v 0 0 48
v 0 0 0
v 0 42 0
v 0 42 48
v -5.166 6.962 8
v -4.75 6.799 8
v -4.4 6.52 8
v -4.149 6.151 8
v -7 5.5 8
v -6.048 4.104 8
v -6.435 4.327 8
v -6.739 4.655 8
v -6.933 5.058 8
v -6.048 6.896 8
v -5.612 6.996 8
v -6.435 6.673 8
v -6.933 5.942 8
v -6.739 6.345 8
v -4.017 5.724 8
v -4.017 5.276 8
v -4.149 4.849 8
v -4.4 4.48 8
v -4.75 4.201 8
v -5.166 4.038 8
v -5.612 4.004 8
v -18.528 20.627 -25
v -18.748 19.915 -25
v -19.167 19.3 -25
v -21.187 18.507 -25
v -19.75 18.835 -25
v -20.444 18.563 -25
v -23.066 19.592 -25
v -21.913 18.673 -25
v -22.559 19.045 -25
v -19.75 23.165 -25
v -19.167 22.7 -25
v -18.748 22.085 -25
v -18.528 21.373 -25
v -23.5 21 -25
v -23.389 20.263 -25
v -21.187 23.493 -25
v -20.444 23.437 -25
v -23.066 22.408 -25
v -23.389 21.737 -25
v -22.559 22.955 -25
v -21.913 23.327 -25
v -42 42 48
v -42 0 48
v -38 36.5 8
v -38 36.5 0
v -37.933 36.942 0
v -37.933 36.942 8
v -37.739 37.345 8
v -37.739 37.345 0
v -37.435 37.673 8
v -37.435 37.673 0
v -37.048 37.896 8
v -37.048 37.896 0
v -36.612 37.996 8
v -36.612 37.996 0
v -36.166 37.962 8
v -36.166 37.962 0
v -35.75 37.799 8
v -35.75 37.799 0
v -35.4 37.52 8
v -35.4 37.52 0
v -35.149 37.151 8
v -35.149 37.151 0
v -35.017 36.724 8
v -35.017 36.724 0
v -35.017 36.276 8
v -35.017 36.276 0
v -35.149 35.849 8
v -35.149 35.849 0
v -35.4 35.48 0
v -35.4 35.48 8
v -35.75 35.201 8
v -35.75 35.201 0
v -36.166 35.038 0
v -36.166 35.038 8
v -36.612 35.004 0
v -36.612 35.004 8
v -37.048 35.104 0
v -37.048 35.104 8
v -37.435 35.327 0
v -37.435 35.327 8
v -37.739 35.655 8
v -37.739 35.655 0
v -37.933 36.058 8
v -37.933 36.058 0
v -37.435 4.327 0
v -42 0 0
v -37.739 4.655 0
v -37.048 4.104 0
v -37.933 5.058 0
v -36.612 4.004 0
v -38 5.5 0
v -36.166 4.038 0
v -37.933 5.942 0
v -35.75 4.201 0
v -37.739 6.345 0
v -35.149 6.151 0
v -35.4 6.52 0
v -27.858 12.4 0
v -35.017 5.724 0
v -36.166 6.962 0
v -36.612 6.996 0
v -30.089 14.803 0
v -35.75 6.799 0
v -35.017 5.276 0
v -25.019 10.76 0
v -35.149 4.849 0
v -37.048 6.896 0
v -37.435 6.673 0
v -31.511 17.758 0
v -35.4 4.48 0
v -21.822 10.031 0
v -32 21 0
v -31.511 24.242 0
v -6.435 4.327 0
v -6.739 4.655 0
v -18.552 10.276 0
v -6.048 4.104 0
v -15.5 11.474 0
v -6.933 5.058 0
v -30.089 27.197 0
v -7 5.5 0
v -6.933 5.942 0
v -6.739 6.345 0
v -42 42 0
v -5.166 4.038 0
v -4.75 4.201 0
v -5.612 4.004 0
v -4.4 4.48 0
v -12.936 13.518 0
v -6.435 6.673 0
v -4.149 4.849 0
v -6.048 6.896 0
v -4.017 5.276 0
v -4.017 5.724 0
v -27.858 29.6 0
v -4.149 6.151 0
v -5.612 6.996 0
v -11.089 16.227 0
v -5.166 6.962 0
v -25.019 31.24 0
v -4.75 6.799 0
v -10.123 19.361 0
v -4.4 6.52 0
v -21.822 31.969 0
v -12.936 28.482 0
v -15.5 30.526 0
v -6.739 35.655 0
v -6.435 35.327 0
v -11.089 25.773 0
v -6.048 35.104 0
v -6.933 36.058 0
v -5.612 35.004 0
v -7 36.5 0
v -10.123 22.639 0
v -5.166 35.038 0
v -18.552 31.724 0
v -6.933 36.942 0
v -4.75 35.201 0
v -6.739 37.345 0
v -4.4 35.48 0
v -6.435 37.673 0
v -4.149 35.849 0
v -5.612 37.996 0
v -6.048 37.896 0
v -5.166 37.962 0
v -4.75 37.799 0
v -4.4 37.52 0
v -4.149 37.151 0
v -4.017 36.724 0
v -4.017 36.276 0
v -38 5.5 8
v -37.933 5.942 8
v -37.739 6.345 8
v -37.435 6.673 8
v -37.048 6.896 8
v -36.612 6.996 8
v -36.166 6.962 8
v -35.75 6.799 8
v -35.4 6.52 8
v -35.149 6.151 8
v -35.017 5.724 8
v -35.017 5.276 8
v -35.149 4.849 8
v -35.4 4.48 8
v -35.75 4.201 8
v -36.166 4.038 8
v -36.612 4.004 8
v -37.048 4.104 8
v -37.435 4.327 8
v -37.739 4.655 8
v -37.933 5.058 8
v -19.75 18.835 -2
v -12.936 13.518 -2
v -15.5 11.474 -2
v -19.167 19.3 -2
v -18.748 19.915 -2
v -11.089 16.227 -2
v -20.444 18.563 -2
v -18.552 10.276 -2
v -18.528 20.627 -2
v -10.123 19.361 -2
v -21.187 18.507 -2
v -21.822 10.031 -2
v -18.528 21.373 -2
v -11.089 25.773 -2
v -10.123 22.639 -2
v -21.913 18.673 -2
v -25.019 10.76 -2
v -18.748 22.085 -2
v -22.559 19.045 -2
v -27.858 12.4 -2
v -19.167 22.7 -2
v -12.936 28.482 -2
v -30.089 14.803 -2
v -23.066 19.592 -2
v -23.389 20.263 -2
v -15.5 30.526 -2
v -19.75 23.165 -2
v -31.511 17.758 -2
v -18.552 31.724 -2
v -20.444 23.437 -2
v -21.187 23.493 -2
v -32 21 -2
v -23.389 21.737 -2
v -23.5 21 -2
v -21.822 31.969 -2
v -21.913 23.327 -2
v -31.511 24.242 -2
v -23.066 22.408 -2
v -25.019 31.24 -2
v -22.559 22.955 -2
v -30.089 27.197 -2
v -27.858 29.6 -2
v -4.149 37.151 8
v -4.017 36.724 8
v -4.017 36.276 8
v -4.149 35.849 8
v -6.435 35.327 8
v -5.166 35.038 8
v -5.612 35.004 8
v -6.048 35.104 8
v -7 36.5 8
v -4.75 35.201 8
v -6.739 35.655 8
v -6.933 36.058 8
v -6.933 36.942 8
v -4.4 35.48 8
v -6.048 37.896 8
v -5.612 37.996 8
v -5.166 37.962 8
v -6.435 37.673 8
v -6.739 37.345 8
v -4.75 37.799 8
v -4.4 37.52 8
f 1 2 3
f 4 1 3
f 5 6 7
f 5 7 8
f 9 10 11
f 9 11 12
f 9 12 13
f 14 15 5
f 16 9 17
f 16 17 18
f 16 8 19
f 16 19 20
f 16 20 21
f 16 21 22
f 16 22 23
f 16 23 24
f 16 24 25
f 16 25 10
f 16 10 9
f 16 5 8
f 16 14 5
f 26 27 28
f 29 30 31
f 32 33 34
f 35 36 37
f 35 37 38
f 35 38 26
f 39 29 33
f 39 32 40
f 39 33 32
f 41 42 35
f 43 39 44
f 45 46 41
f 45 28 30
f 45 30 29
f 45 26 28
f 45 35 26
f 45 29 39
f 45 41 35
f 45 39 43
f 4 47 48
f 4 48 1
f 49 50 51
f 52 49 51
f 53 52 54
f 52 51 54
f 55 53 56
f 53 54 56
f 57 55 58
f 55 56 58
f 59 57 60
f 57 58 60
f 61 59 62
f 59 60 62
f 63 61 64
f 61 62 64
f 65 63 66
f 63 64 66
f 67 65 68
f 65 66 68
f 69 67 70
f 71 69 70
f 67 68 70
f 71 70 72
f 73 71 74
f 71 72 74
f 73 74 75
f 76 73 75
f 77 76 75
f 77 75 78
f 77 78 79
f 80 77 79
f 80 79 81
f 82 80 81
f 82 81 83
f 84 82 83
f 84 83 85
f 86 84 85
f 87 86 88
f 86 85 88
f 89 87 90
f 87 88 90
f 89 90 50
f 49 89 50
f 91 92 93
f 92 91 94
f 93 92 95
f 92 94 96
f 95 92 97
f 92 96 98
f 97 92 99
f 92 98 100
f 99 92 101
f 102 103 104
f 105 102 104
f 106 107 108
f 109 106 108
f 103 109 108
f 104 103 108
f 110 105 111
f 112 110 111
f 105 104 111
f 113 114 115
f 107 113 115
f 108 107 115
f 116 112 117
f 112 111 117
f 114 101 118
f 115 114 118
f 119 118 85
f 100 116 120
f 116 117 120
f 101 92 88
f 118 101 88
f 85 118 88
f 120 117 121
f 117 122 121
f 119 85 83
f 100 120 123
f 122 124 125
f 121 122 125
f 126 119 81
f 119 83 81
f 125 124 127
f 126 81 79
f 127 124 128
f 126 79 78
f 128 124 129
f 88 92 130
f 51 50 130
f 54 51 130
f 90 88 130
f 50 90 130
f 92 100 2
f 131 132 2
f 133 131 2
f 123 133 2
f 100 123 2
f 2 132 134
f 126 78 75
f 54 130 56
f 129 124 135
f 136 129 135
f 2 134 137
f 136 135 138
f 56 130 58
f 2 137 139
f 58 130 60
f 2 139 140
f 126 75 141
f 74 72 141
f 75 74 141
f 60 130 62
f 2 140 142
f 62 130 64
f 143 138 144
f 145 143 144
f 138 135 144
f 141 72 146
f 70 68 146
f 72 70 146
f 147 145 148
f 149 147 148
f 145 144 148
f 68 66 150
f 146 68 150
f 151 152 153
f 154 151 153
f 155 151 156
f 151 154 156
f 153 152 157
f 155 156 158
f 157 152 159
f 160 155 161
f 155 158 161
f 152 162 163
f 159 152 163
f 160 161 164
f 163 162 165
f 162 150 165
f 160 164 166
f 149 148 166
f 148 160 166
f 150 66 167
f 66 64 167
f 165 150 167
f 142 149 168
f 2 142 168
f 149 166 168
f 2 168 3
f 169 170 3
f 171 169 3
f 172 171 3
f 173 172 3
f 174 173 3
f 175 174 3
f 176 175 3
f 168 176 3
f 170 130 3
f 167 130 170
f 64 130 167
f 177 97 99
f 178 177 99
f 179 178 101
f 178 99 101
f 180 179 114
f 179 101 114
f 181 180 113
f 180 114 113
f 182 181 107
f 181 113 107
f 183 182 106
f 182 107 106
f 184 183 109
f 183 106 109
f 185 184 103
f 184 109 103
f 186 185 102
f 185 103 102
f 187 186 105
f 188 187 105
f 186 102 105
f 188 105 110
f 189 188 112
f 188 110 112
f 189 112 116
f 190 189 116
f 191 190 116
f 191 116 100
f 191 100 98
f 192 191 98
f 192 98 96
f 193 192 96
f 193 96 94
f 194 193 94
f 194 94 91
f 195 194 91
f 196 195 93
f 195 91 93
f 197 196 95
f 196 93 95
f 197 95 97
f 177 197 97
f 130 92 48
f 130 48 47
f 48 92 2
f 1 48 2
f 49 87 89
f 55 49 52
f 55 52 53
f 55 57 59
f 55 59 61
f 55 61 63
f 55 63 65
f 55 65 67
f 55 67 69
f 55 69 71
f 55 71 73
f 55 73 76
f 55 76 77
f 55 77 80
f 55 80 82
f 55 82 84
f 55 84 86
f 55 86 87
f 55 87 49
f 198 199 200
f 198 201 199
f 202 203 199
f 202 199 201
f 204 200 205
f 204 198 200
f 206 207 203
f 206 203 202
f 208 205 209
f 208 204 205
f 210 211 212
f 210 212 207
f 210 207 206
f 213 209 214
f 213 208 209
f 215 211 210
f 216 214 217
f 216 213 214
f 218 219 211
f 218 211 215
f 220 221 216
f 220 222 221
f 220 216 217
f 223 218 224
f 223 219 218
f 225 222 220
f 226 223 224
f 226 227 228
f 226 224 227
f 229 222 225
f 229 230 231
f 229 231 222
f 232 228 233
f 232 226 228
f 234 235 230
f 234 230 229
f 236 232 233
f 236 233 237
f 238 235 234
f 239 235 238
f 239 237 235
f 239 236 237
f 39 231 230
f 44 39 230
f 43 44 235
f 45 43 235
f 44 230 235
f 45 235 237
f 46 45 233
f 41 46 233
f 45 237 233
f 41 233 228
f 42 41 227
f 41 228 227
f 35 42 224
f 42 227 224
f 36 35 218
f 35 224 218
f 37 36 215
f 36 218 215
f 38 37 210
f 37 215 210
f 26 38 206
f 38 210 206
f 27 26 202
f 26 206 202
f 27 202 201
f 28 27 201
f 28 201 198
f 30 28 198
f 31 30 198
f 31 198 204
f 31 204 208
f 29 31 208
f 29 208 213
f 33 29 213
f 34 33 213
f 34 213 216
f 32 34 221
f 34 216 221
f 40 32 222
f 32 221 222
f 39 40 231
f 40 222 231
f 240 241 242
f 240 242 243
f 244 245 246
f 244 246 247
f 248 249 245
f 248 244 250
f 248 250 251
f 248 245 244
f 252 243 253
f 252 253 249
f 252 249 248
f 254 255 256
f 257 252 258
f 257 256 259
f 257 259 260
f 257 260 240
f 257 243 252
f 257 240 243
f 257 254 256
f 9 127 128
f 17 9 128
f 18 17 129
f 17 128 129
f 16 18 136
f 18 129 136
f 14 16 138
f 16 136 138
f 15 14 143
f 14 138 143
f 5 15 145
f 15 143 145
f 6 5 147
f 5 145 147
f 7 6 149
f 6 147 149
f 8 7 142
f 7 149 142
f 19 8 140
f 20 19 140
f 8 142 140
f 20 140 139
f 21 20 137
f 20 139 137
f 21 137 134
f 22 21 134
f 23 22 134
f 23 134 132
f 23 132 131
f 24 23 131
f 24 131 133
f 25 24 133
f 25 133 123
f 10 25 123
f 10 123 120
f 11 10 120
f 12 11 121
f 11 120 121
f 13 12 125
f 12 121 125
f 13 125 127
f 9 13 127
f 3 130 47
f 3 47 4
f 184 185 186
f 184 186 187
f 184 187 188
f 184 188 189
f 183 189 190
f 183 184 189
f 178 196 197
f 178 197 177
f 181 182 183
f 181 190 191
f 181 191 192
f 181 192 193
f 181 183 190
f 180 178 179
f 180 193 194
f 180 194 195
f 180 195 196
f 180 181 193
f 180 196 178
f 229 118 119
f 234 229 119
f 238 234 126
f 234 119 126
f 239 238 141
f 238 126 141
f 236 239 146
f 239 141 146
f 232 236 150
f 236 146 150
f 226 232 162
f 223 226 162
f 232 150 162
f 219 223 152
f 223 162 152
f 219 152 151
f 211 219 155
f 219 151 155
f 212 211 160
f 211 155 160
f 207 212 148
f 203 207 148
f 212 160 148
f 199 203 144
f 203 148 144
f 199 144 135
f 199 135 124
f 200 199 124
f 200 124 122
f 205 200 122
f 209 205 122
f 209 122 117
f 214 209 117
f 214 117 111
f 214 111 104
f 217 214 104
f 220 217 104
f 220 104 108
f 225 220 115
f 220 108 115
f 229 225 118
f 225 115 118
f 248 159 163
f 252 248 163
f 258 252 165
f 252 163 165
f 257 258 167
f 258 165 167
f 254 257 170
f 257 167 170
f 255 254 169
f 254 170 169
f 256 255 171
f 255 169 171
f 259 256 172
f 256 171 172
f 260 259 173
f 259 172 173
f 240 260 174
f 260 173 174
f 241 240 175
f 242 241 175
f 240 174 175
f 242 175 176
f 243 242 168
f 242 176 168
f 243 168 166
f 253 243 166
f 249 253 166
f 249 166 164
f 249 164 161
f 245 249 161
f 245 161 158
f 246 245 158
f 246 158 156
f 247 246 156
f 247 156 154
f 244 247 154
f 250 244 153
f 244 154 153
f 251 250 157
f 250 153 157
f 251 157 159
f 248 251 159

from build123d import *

# Parameters (mm, degrees)
SKETCH_1_W          = 42
SKETCH_1_H          = 42
EXTRUDE_1_DEPTH     = 48
SKETCH_3_R          = 11
EXTRUDE_2_DEPTH     = 2
SKETCH_4_R          = 2.5
EXTRUDE_3_DEPTH     = 23
SKETCH_5_R          = 1.5
CUT_EXTRUDE_1_DEPTH = 8


with BuildPart() as part:
    # 草图1 → 凸台-拉伸1 (new body)
    with BuildSketch(Plane.XY):
        with Locations((-21, 21)):
            Rectangle(SKETCH_1_W, SKETCH_1_H)
    extrude(amount=EXTRUDE_1_DEPTH)

    # 草图3 → 凸台-拉伸2 (add)
    with BuildSketch(Plane(origin=(0, 0, 0), x_dir=(-1, 0, 0), z_dir=(0, 0, -1))):
        with Locations((21, 21)):
            Circle(SKETCH_3_R)
    extrude(amount=EXTRUDE_2_DEPTH)

    # 草图4 → 凸台-拉伸3 (add)
    with BuildSketch(Plane(origin=(0, 0, -2), x_dir=(-1, 0, 0), z_dir=(0, 0, -1))):
        with Locations((21, 21)):
            Circle(SKETCH_4_R)
    extrude(amount=EXTRUDE_3_DEPTH)

    # 草图5 → 切除-拉伸1 (cut)
    with BuildSketch(Plane(origin=(0, 0, 0), x_dir=(-1, 0, 0), z_dir=(0, 0, -1))):
        with Locations((5.5, 5.5)):
            Circle(SKETCH_5_R)
        with Locations((36.5, 5.5)):
            Circle(SKETCH_5_R)
        with Locations((36.5, 36.5)):
            Circle(SKETCH_5_R)
        with Locations((5.5, 36.5)):
            Circle(SKETCH_5_R)
    extrude(amount=-CUT_EXTRUDE_1_DEPTH, mode=Mode.SUBTRACT)


solid = part.part
